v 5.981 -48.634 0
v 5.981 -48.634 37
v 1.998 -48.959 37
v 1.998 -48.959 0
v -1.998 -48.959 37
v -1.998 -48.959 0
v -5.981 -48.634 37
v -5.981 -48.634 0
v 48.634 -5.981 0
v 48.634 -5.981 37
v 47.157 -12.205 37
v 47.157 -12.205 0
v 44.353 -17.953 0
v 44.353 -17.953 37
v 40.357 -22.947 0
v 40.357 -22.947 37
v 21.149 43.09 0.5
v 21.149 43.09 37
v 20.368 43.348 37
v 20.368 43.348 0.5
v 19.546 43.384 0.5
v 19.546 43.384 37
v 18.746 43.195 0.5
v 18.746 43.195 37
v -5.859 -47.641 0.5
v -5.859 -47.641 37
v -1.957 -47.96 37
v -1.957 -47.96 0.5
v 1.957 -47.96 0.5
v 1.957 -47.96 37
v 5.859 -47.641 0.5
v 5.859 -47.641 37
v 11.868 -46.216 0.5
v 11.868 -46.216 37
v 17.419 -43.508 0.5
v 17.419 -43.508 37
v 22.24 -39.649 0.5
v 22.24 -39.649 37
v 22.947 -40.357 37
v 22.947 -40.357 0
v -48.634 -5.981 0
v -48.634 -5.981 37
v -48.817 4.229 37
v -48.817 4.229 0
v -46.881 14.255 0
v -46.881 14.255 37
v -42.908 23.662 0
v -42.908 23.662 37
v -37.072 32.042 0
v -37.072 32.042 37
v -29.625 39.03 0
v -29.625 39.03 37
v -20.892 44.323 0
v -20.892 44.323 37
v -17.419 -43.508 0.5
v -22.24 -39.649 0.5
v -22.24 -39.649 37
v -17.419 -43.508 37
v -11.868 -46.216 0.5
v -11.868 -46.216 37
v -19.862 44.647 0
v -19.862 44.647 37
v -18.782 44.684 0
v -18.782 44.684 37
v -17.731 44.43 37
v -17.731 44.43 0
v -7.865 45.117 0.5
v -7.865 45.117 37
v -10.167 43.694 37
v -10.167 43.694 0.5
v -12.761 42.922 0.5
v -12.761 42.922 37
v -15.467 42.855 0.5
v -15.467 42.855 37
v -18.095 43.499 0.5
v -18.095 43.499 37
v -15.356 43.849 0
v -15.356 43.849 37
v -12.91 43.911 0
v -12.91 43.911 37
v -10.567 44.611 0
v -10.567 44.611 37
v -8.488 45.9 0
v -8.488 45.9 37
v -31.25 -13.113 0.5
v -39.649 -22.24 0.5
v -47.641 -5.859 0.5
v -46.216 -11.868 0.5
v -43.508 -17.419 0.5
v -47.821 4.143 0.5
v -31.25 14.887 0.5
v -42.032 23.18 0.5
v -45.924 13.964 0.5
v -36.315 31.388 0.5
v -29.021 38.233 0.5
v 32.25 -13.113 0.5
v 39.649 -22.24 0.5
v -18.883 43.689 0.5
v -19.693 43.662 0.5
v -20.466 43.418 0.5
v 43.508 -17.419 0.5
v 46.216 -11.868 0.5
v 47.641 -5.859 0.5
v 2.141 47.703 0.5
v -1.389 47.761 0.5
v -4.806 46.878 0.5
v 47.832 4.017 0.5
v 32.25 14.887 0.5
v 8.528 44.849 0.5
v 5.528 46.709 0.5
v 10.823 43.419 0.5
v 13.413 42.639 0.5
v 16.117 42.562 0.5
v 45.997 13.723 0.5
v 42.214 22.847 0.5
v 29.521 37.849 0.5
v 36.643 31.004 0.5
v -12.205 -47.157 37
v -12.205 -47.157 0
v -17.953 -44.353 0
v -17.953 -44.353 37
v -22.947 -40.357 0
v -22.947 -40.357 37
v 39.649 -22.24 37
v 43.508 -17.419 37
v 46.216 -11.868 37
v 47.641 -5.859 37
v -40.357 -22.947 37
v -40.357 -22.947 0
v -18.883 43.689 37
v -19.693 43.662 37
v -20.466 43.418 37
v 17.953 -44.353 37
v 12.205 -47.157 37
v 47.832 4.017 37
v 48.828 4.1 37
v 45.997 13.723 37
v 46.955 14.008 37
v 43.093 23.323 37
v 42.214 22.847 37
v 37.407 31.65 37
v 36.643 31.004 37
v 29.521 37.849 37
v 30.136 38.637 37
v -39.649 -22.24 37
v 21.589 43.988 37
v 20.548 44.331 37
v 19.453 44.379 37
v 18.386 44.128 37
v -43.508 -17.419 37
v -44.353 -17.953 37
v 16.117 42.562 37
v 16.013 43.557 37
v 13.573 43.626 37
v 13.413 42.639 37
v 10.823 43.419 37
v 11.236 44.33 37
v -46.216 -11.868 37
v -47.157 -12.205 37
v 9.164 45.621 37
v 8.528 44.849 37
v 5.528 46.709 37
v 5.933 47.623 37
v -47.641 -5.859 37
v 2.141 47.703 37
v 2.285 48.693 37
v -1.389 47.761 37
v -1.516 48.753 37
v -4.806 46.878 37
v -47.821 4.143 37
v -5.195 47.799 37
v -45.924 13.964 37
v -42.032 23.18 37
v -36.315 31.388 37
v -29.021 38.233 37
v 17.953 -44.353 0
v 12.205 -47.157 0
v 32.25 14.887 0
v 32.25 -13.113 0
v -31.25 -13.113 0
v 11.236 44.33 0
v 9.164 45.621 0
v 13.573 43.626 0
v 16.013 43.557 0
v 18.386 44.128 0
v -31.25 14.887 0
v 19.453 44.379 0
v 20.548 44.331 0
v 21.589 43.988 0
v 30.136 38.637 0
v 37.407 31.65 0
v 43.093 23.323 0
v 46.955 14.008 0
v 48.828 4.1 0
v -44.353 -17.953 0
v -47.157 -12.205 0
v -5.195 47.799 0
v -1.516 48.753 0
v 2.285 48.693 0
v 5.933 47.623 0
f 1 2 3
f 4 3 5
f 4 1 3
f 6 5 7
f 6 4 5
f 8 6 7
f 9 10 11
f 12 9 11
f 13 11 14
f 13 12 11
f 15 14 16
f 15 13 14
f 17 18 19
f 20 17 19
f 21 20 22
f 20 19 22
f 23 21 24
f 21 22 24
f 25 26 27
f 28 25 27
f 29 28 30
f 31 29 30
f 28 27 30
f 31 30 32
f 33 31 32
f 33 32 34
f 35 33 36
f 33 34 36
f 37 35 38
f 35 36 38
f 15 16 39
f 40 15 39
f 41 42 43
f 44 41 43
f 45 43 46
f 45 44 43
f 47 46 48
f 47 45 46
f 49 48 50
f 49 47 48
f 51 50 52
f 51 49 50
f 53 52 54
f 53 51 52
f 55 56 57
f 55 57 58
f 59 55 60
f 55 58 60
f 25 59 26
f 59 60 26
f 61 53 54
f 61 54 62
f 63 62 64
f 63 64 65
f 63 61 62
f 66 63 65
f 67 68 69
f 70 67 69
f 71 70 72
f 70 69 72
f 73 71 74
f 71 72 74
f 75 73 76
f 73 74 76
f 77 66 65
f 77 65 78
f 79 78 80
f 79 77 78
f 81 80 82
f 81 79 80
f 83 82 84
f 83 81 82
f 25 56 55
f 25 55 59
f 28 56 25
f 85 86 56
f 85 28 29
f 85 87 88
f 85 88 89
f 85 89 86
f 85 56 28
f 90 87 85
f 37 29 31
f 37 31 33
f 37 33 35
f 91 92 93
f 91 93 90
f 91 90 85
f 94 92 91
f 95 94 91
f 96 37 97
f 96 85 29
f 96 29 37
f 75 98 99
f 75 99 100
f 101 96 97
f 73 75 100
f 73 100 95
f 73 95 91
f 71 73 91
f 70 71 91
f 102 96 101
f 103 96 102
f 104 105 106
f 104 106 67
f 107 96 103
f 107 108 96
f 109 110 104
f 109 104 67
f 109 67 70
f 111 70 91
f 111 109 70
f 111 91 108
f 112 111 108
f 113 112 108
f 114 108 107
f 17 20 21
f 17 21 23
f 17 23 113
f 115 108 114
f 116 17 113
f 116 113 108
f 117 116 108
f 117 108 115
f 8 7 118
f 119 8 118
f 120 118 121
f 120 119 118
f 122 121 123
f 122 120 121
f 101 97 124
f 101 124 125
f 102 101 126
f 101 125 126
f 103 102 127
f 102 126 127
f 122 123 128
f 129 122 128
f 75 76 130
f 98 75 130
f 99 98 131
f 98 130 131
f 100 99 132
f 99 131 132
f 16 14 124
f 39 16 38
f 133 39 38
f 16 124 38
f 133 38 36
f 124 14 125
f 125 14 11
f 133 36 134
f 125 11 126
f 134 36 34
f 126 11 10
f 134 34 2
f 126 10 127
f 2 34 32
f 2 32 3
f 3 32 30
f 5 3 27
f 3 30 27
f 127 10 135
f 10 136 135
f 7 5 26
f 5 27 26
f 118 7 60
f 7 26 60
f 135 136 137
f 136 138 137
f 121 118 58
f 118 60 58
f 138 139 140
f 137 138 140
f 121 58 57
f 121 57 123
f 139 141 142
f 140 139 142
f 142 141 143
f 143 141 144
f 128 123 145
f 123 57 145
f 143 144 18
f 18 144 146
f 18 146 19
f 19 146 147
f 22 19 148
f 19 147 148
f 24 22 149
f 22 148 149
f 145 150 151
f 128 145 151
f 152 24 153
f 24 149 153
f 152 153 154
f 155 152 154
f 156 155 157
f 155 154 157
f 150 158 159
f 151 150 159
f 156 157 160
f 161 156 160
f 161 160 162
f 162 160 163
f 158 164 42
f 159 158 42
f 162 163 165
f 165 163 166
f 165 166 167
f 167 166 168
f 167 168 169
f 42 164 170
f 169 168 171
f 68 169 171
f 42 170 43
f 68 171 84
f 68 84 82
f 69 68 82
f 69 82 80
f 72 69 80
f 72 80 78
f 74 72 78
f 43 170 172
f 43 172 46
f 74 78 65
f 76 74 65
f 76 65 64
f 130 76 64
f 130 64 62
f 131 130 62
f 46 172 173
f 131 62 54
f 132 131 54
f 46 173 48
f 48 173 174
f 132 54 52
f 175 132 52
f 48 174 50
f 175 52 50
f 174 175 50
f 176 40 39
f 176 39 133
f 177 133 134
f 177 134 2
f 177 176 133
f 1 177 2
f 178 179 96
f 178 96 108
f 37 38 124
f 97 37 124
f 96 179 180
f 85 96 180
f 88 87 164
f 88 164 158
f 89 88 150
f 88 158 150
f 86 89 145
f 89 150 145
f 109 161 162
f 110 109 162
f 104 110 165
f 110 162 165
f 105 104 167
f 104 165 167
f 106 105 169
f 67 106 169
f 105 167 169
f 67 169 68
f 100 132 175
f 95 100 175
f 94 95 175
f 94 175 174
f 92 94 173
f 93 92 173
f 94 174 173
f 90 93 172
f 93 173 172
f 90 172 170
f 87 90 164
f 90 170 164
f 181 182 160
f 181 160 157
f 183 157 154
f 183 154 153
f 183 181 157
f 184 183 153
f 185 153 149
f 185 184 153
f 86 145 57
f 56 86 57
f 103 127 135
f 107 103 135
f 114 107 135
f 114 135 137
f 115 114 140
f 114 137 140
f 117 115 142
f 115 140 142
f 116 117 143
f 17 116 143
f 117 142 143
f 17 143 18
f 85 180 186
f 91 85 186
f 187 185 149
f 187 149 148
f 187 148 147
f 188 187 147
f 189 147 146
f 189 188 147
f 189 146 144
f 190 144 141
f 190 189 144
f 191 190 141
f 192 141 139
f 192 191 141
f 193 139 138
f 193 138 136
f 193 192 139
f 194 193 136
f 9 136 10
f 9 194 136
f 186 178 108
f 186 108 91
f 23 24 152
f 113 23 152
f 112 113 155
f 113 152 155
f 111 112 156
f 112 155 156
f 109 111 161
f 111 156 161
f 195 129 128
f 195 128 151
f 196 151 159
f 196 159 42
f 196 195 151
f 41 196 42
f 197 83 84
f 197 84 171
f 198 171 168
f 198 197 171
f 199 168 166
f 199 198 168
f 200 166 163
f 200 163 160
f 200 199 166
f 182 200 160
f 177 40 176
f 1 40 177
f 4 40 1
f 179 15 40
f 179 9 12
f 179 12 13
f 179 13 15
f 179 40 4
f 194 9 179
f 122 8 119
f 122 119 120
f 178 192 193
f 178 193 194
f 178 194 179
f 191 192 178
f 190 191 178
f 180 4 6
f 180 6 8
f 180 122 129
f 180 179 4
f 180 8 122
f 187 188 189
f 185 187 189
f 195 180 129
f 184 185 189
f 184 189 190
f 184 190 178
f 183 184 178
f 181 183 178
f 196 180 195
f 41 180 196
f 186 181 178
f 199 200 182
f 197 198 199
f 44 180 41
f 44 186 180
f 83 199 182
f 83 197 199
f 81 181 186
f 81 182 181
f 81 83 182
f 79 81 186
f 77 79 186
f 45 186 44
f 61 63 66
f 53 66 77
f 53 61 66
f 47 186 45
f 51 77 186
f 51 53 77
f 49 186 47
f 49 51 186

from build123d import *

# Parameters (mm, degrees)
BOSS_EXTRUDE1_DEPTH = 37
CUT_EXTRUDE1_DEPTH  = 36.5
CUT_EXTRUDE2_REACH  = 80.556
SKETCH5_W           = 63.5
SKETCH5_H           = 28


with BuildPart() as part:
    # Sketch1 → Boss-Extrude1 (new body)
    with BuildSketch(Plane.XY):
        with BuildLine():
            Line((40.356535193, -22.947426174), (22.947426174, -40.356535193))
            ThreePointArc((22.947426174, -40.356535193), (15.156681171, -45.914203278), (5.981257322, -48.63357442))
            ThreePointArc((5.981257322, -48.63357442), (0, -49), (-5.981257322, -48.63357442))
            ThreePointArc((-5.981257322, -48.63357442), (-15.156681171, -45.914203278), (-22.947426174, -40.356535193))
            Line((-22.947426174, -40.356535193), (-40.356535193, -22.947426174))
            ThreePointArc((-40.356535193, -22.947426174), (-45.914203278, -15.156681171), (-48.63357442, -5.981257322))
            ThreePointArc((-48.63357442, -5.981257322), (-42.907888217, 23.662483572), (-20.892307913, 44.322809817))
            ThreePointArc((-20.892307913, 44.322809817), (-19.322951214, 44.702303901), (-17.73141344, 44.430451502))
            ThreePointArc((-17.73141344, 44.430451502), (-12.910393927, 43.910800792), (-8.488178405, 45.899839725))
            ThreePointArc((-8.488178405, 45.899839725), (0.386708758, 48.850803922), (9.16390657, 45.62084875))
            ThreePointArc((9.16390657, 45.62084875), (13.572775182, 43.625772556), (18.385878971, 44.128249799))
            ThreePointArc((18.385878971, 44.128249799), (20.002215513, 44.392928913), (21.589134046, 43.987603835))
            ThreePointArc((21.589134046, 43.987603835), (43.093258956, 23.323186587), (48.63357442, -5.981257322))
            ThreePointArc((48.63357442, -5.981257322), (45.914203278, -15.156681171), (40.356535193, -22.947426174))
        make_face()
    extrude(amount=BOSS_EXTRUDE1_DEPTH)

    # Sketch3 → Cut-Extrude1 (cut)
    with BuildSketch(Plane.XY.offset(37)):
        with BuildLine():
            Line((-39.649428412, -22.240319392), (-22.240319392, -39.649428412))
            ThreePointArc((-22.240319392, -39.649428412), (-14.718220769, -45.015452769), (-5.859190846, -47.641052493))
            ThreePointArc((-5.859190846, -47.641052493), (0, -48), (5.859190846, -47.641052493))
            ThreePointArc((5.859190846, -47.641052493), (14.718220769, -45.015452769), (22.240319392, -39.649428412))
            Line((22.240319392, -39.649428412), (39.649428412, -22.240319392))
            ThreePointArc((39.649428412, -22.240319392), (45.015452769, -14.718220769), (47.641052493, -5.859190846))
            ThreePointArc((47.641052493, -5.859190846), (42.213804691, 22.847203188), (21.148539474, 43.089897634))
            ThreePointArc((21.148539474, 43.089897634), (19.958350574, 43.393891443), (18.746098167, 43.195382107))
            ThreePointArc((18.746098167, 43.195382107), (13.413001918, 42.638618817), (8.52781313, 44.849236713))
            ThreePointArc((8.52781313, 44.849236713), (0.378047137, 47.850813988), (-7.865478644, 45.117238565))
            ThreePointArc((-7.865478644, 45.117238565), (-12.761098878, 42.921980343), (-18.095263428, 43.498993941))
            ThreePointArc((-18.095263428, 43.498993941), (-19.288916758, 43.702883241), (-20.465934283, 43.418262678))
            ThreePointArc((-20.465934283, 43.418262678), (-42.032217029, 23.179575744), (-47.641052493, -5.859190846))
            ThreePointArc((-47.641052493, -5.859190846), (-45.015452769, -14.718220769), (-39.649428412, -22.240319392))
        make_face()
    extrude(amount=-CUT_EXTRUDE1_DEPTH, mode=Mode.SUBTRACT)

    # Sketch5 → Cut-Extrude2 (cut, up to next)
    with BuildSketch(Plane(origin=(0, 0, 0), x_dir=(-1, 0, 0), z_dir=(0, 0, -1)), mode=Mode.PRIVATE) as cut_extrude2_sk1:
        with Locations((-0.5, 0.886817972)):
            Rectangle(SKETCH5_W, SKETCH5_H)
    cut_extrude2_tool1 = extrude(cut_extrude2_sk1.sketch, amount=-CUT_EXTRUDE2_REACH, mode=Mode.PRIVATE) & part.part
    add(cut_extrude2_tool1.solids().sort_by_distance((0.5, 0.886818, 0))[0], mode=Mode.SUBTRACT)


solid = part.part
